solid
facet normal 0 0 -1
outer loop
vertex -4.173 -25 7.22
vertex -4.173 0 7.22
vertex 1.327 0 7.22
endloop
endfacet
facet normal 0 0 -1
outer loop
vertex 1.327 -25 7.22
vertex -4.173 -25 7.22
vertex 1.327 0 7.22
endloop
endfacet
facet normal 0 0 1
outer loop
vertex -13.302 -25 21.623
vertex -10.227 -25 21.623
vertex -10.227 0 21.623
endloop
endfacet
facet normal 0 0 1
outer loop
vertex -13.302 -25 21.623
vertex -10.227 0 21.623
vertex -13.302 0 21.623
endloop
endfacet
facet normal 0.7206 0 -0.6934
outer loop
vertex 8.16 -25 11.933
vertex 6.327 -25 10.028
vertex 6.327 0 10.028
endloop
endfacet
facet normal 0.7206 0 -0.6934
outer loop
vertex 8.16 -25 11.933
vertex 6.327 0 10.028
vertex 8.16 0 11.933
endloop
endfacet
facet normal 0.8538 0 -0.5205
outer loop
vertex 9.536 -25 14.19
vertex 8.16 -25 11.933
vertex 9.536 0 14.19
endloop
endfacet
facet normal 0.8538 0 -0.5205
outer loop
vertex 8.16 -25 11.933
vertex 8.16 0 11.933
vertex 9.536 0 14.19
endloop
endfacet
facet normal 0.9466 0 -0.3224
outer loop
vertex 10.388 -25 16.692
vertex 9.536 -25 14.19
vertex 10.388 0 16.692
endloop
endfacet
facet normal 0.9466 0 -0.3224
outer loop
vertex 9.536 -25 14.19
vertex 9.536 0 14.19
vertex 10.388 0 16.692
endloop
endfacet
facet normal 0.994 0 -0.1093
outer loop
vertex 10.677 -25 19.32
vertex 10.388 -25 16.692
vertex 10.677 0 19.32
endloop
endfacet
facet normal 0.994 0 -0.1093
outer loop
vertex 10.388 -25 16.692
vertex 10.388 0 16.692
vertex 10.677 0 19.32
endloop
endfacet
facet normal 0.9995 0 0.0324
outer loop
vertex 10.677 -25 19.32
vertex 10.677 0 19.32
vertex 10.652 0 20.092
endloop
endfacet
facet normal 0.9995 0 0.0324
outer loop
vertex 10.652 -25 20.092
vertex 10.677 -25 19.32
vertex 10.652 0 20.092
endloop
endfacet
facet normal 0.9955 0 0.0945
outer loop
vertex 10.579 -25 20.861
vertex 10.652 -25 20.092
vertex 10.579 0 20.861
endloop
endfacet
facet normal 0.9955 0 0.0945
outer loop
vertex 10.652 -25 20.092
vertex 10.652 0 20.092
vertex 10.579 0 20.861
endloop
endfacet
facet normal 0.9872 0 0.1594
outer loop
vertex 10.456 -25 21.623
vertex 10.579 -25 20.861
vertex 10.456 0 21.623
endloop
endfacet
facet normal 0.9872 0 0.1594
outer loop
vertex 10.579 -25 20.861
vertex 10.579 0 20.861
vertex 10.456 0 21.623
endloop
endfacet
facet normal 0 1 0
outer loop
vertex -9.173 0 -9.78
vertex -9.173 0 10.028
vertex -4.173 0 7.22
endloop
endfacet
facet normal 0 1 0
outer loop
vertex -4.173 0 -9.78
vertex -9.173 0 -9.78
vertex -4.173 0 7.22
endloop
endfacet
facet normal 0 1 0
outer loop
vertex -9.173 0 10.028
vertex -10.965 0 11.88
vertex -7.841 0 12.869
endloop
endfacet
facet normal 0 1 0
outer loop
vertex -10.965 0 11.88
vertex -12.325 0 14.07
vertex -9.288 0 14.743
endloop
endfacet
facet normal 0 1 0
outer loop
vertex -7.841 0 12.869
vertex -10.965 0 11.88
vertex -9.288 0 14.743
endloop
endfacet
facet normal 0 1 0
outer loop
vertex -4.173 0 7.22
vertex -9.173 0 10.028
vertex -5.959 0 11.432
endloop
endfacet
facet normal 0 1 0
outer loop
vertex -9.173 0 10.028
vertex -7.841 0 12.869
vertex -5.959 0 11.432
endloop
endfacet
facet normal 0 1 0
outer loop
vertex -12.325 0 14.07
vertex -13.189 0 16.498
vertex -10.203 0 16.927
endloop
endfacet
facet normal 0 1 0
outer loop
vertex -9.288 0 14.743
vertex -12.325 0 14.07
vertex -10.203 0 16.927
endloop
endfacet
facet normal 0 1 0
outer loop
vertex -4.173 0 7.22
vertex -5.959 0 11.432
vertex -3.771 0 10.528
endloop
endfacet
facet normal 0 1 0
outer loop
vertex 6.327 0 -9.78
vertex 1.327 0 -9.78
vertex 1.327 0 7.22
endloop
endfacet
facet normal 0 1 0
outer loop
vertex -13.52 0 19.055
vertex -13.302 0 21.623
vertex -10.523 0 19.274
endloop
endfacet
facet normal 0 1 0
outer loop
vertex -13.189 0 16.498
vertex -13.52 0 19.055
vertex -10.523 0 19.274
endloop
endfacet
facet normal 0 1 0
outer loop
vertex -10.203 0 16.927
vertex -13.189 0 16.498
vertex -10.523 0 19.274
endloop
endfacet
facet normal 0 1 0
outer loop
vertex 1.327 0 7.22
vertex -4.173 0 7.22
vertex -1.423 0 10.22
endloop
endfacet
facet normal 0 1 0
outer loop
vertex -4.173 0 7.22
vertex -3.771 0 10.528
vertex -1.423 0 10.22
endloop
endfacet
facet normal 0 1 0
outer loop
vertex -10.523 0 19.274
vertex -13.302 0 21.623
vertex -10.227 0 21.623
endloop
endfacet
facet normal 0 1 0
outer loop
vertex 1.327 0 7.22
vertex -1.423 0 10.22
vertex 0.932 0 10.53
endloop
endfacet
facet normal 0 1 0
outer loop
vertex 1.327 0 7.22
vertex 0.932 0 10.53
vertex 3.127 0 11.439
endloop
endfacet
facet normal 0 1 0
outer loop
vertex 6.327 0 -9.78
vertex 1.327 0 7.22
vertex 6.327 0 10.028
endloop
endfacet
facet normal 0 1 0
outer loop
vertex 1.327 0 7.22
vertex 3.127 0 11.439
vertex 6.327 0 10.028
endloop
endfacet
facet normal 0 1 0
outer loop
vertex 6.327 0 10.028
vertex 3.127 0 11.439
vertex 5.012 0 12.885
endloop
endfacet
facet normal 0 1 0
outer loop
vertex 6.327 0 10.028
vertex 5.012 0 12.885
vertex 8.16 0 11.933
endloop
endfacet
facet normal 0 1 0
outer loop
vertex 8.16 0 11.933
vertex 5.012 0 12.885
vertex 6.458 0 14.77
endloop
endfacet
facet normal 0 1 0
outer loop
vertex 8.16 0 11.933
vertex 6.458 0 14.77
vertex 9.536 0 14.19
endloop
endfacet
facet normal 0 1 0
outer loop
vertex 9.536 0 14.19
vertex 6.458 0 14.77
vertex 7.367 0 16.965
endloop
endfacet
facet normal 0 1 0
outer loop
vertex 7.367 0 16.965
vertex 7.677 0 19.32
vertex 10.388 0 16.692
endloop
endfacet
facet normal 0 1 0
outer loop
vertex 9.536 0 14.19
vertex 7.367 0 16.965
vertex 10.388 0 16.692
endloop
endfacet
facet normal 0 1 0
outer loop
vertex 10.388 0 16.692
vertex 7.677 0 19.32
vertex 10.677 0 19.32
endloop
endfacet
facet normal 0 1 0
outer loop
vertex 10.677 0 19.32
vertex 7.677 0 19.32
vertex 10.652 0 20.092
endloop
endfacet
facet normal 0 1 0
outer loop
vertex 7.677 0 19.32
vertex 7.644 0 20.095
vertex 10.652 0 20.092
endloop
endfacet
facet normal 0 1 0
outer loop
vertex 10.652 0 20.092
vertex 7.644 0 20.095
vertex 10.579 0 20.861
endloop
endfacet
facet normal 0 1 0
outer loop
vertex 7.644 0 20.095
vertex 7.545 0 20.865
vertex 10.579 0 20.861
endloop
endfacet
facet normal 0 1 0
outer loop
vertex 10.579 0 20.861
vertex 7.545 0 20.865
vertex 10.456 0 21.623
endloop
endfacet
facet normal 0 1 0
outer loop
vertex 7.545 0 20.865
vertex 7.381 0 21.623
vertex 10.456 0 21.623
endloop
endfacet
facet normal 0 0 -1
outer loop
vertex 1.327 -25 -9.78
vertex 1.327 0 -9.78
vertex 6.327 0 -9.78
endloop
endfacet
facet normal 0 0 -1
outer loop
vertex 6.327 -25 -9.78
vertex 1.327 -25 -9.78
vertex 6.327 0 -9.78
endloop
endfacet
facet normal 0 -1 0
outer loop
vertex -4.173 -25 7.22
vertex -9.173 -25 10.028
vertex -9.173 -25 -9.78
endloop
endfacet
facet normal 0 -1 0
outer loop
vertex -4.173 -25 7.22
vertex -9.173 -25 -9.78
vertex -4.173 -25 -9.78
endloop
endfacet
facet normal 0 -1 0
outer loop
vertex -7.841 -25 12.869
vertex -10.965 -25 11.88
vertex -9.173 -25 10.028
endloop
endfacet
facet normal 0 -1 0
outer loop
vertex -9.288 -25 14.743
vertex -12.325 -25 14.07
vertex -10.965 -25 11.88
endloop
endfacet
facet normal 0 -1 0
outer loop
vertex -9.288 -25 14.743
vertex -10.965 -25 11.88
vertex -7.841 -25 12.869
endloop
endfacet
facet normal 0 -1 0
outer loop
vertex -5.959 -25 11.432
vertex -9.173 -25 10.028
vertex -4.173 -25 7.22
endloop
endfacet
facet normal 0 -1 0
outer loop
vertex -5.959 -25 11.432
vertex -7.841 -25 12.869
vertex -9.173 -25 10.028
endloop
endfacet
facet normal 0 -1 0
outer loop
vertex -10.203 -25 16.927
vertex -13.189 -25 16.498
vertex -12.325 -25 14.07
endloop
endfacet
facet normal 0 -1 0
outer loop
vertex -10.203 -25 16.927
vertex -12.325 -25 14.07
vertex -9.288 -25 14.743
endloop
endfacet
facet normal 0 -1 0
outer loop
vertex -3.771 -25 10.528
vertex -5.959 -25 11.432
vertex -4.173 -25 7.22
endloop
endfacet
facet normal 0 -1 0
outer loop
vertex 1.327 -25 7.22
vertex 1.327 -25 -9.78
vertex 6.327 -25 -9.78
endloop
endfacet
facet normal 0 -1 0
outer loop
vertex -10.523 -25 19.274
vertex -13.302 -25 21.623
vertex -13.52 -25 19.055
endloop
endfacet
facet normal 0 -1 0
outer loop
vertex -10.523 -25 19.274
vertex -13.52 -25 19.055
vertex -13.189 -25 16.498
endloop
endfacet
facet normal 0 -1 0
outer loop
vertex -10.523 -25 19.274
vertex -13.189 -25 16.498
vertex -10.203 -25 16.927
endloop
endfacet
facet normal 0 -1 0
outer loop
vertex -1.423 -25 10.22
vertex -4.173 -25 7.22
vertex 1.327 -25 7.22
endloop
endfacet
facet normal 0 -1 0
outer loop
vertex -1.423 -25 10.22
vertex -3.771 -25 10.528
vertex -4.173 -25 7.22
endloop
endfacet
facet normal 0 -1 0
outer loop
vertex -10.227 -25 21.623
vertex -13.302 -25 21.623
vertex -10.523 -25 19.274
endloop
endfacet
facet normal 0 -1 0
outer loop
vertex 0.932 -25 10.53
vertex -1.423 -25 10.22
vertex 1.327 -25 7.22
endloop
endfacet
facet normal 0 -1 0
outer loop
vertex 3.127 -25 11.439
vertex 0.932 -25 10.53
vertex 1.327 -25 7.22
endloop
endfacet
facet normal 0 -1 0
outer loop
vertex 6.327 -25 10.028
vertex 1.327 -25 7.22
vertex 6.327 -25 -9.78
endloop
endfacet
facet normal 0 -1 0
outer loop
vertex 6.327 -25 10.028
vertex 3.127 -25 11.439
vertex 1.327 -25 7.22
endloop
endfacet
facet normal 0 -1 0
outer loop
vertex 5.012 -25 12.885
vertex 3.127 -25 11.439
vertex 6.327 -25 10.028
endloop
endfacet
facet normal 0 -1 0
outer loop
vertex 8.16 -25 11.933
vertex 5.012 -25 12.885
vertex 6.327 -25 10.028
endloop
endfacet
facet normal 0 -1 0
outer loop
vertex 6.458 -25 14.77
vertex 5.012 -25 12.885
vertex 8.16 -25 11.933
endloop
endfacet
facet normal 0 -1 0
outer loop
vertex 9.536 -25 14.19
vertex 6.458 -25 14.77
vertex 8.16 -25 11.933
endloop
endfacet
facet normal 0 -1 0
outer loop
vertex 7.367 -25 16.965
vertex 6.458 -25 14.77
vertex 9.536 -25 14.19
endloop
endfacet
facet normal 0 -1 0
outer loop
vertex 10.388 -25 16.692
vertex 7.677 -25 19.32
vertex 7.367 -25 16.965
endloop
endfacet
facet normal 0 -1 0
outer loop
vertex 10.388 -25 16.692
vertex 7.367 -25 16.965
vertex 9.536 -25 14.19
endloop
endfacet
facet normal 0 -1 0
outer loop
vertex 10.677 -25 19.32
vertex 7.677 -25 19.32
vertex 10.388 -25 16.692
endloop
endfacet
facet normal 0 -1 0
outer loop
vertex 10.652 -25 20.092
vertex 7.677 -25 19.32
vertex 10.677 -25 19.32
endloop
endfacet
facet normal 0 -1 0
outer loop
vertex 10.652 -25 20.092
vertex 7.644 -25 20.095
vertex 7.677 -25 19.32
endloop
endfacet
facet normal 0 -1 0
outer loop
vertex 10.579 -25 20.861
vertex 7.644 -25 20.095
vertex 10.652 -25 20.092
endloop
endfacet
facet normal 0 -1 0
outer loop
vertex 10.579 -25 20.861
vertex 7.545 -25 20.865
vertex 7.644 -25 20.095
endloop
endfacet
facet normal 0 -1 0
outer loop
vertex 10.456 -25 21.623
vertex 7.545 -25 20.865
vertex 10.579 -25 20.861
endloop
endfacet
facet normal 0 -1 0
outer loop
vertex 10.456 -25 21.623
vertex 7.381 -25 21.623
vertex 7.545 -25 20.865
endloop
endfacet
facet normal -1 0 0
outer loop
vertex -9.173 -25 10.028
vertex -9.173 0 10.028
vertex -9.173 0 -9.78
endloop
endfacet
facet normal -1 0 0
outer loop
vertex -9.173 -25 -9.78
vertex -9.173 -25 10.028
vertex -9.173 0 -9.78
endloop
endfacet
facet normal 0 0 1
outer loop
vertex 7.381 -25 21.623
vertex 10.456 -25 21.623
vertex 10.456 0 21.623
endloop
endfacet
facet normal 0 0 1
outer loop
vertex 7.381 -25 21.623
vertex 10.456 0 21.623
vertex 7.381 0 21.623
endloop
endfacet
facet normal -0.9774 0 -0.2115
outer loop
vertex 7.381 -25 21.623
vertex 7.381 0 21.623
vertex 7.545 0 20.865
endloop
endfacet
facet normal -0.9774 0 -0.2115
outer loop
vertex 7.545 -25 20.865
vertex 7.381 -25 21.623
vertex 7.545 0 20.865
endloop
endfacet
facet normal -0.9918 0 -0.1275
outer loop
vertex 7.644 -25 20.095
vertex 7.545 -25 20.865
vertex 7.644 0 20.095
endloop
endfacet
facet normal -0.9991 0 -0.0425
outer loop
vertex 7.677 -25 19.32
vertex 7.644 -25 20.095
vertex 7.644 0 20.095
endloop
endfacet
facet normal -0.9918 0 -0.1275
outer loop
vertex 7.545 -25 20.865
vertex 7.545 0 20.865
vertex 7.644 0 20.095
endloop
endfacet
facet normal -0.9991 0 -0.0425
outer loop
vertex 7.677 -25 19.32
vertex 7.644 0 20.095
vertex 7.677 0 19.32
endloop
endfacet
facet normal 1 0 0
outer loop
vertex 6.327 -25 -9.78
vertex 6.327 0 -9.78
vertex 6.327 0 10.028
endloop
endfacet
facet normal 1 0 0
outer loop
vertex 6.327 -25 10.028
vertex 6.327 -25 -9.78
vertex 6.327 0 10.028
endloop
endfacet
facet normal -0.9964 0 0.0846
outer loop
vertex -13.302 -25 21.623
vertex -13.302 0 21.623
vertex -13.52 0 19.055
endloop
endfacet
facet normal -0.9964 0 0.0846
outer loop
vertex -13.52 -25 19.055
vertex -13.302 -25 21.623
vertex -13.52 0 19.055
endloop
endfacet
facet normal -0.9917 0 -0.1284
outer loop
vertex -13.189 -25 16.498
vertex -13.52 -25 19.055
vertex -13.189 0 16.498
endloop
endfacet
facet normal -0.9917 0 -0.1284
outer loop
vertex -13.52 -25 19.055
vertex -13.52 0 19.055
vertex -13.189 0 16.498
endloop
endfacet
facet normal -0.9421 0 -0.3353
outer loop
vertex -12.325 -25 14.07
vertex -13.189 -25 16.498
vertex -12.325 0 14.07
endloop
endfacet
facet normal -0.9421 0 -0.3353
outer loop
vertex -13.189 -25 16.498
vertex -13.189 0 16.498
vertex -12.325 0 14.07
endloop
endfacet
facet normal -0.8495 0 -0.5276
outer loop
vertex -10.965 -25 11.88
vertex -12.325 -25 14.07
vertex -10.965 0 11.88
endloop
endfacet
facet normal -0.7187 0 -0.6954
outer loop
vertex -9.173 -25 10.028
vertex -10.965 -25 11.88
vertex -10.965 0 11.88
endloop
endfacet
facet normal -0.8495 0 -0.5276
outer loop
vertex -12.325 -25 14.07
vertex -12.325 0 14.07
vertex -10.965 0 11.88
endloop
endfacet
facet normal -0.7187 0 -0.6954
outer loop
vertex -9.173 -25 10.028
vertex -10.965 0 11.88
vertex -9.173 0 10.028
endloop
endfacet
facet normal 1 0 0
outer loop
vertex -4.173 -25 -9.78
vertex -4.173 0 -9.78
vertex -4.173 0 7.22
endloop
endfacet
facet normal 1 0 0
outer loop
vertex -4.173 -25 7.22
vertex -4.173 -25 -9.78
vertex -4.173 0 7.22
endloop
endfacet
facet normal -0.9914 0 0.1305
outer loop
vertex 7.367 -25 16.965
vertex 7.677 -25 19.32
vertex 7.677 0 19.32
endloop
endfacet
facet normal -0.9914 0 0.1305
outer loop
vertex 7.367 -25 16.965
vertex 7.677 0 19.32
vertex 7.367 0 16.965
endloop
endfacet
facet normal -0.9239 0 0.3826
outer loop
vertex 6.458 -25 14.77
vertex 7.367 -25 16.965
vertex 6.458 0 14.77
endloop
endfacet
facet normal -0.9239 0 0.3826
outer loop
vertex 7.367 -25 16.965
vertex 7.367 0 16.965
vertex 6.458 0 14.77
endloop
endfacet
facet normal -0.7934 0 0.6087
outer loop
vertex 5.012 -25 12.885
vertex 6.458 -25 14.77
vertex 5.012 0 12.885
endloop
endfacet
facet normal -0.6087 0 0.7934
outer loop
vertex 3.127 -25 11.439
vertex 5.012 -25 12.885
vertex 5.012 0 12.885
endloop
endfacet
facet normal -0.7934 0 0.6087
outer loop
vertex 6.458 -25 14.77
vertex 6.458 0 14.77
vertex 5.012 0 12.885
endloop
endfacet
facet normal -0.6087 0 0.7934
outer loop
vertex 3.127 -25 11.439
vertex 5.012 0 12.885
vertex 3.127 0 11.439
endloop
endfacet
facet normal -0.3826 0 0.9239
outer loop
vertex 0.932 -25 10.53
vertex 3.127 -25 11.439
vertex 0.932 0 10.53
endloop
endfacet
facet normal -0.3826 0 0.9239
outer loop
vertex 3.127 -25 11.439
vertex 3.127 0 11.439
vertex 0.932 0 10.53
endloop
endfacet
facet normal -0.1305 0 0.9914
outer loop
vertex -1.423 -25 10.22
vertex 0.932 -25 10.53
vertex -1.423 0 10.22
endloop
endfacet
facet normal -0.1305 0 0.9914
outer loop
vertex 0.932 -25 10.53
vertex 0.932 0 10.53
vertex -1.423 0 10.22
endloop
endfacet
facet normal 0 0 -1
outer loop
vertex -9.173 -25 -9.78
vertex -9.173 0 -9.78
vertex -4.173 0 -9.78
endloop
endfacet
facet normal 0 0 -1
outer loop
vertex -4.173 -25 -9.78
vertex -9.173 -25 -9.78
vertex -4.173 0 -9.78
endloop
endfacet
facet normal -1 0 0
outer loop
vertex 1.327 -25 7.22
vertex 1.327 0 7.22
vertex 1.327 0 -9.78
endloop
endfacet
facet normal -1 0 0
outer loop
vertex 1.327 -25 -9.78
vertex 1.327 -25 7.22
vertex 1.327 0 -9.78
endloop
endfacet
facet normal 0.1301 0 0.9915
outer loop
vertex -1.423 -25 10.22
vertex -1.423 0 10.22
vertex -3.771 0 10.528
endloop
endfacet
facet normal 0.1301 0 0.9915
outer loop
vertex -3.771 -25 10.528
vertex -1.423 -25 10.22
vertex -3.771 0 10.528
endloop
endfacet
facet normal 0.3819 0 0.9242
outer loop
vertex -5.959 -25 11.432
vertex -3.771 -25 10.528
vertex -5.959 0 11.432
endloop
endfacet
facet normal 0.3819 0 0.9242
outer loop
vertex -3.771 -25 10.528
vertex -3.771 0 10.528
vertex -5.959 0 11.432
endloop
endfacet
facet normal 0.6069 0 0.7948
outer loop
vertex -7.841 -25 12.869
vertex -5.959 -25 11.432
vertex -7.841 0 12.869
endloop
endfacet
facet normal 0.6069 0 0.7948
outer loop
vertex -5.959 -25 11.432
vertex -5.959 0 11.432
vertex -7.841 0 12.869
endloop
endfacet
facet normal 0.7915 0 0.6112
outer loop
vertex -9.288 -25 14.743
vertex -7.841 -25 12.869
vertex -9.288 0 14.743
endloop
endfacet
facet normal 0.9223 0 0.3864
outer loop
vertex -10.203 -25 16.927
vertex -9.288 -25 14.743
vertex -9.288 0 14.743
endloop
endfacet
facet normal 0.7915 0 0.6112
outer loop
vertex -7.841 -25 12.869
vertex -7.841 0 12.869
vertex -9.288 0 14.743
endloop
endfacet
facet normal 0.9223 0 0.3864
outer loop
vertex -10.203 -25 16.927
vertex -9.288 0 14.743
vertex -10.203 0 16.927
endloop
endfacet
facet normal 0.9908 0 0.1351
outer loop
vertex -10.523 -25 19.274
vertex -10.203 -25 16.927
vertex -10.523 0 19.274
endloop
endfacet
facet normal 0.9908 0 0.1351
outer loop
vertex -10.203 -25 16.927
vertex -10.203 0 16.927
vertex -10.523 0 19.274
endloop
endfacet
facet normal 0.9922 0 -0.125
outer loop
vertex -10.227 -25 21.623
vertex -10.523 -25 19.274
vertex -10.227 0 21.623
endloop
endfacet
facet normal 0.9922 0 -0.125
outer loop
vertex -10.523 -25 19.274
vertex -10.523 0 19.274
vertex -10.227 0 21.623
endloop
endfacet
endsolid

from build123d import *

# Parameters (mm, degrees)
F1_DEPTH = 25


with BuildPart() as f1:
    # F0 (on Front) → F1 (new body)
    with BuildSketch(Plane.XZ):
        with BuildLine():
            Line((-1.422933, 10.220143), (1.327067, 10.220143))
            Line((1.327067, 10.220143), (6.327067, 10.220143))
            Line((6.327067, 10.220143), (6.327067, 10.027808))
            ThreePointArc((6.327067, 10.027808), (9.535739, 14.190085), (10.677067, 19.320143))
            ThreePointArc((10.677067, 19.320143), (10.621655, 20.476818), (10.455927, 21.622899))
            Line((10.455927, 21.622899), (7.380891, 21.622899))
            ThreePointArc((7.380891, 21.622899), (7.602719, 20.481005), (7.677067, 19.320143))
            ThreePointArc((7.677067, 19.320143), (5.011739, 12.885472), (-1.422933, 10.220143))
        make_face()
        with BuildLine():
            ThreePointArc((-9.172933, 10.027808), (-6.818653, 8.489806), (-4.172933, 7.536787))
            Line((-4.172933, 7.536787), (-4.172933, 10.220143))
            Line((-4.172933, 10.220143), (-9.172933, 10.220143))
            Line((-9.172933, 10.220143), (-9.172933, 10.027808))
        make_face()
        with BuildLine():
            ThreePointArc((-4.172933, 7.536787), (-2.807018, 7.299565), (-1.422933, 7.220143))
            ThreePointArc((-1.422933, 7.220143), (-0.038848, 7.299565), (1.327067, 7.536787))
            Line((1.327067, 7.536787), (1.327067, 10.220143))
            Line((1.327067, 10.220143), (-1.422933, 10.220143))
            Line((-1.422933, 10.220143), (-4.172933, 10.220143))
            Line((-4.172933, 10.220143), (-4.172933, 7.536787))
        make_face()
        with BuildLine():
            Line((1.327067, 10.220143), (1.327067, 7.536787))
            ThreePointArc((1.327067, 7.536787), (3.972787, 8.489806), (6.327067, 10.027808))
            Line((6.327067, 10.027808), (6.327067, 10.220143))
            Line((6.327067, 10.220143), (1.327067, 10.220143))
        make_face()
        with BuildLine():
            Line((1.327067, 7.536787), (1.327067, 7.220143))
            Line((1.327067, 7.220143), (1.327067, -9.779857))
            Line((1.327067, -9.779857), (6.327067, -9.779857))
            Line((6.327067, -9.779857), (6.327067, 10.027808))
            ThreePointArc((6.327067, 10.027808), (3.972787, 8.489806), (1.327067, 7.536787))
        make_face()
        with BuildLine():
            ThreePointArc((1.327067, 7.536787), (-0.038848, 7.299565), (-1.422933, 7.220143))
            Line((-1.422933, 7.220143), (1.327067, 7.220143))
            Line((1.327067, 7.220143), (1.327067, 7.536787))
        make_face()
        with BuildLine():
            Line((-4.172933, 7.536787), (-4.172933, 7.220143))
            Line((-4.172933, 7.220143), (-1.422933, 7.220143))
            ThreePointArc((-1.422933, 7.220143), (-2.807018, 7.299565), (-4.172933, 7.536787))
        make_face()
        with BuildLine():
            Line((-4.172933, -9.779857), (-4.172933, 7.220143))
            Line((-4.172933, 7.220143), (-4.172933, 7.536787))
            ThreePointArc((-4.172933, 7.536787), (-6.818653, 8.489806), (-9.172933, 10.027808))
            Line((-9.172933, 10.027808), (-9.172933, -9.779857))
            Line((-9.172933, -9.779857), (-4.172933, -9.779857))
        make_face()
        with BuildLine():
            Line((-9.172933, 10.220143), (-4.172933, 10.220143))
            Line((-4.172933, 10.220143), (-1.422933, 10.220143))
            ThreePointArc((-1.422933, 10.220143), (-8.625886, 13.758897), (-10.226757, 21.622899))
            Line((-10.226757, 21.622899), (-13.301793, 21.622899))
            ThreePointArc((-13.301793, 21.622899), (-12.821818, 15.26115), (-9.172933, 10.027808))
            Line((-9.172933, 10.027808), (-9.172933, 10.220143))
        make_face()
    extrude(amount=F1_DEPTH)


solid = f1.part
